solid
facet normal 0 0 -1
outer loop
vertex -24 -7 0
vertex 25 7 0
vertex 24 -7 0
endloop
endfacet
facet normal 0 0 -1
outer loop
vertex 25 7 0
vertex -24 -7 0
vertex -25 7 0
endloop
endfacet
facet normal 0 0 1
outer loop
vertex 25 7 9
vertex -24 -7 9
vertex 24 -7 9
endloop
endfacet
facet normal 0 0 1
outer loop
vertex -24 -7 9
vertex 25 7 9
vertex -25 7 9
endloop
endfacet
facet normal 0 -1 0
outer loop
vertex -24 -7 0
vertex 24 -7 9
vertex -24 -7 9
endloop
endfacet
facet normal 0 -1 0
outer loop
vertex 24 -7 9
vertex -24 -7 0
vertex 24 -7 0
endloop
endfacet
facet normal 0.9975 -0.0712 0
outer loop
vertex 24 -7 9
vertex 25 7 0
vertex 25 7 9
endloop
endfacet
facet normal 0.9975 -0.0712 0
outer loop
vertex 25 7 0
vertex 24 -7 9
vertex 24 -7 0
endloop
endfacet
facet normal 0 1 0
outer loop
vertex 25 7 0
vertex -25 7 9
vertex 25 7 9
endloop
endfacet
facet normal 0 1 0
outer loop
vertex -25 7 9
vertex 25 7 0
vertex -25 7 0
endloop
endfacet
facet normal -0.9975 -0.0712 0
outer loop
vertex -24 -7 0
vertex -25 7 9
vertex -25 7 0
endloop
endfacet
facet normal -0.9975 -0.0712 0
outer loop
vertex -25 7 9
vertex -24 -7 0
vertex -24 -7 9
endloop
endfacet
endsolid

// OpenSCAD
// Rectangular shaft key with chamfered ends.
$fn = 60;
eps = 0.02;
key_w = 14;
key_h = 9;
key_l = 50;
chamfer = 1;
polyhedron(points = [
    [-key_l / 2 + chamfer, -key_w / 2, 0], [key_l / 2 - chamfer, -key_w / 2, 0], [key_l / 2, key_w / 2, 0], [-key_l / 2, key_w / 2, 0],
    [-key_l / 2 + chamfer, -key_w / 2, key_h], [key_l / 2 - chamfer, -key_w / 2, key_h], [key_l / 2, key_w / 2, key_h], [-key_l / 2, key_w / 2, key_h]
], faces = [[0,1,2,3],[4,7,6,5],[0,4,5,1],[1,5,6,2],[2,6,7,3],[3,7,4,0]]);
